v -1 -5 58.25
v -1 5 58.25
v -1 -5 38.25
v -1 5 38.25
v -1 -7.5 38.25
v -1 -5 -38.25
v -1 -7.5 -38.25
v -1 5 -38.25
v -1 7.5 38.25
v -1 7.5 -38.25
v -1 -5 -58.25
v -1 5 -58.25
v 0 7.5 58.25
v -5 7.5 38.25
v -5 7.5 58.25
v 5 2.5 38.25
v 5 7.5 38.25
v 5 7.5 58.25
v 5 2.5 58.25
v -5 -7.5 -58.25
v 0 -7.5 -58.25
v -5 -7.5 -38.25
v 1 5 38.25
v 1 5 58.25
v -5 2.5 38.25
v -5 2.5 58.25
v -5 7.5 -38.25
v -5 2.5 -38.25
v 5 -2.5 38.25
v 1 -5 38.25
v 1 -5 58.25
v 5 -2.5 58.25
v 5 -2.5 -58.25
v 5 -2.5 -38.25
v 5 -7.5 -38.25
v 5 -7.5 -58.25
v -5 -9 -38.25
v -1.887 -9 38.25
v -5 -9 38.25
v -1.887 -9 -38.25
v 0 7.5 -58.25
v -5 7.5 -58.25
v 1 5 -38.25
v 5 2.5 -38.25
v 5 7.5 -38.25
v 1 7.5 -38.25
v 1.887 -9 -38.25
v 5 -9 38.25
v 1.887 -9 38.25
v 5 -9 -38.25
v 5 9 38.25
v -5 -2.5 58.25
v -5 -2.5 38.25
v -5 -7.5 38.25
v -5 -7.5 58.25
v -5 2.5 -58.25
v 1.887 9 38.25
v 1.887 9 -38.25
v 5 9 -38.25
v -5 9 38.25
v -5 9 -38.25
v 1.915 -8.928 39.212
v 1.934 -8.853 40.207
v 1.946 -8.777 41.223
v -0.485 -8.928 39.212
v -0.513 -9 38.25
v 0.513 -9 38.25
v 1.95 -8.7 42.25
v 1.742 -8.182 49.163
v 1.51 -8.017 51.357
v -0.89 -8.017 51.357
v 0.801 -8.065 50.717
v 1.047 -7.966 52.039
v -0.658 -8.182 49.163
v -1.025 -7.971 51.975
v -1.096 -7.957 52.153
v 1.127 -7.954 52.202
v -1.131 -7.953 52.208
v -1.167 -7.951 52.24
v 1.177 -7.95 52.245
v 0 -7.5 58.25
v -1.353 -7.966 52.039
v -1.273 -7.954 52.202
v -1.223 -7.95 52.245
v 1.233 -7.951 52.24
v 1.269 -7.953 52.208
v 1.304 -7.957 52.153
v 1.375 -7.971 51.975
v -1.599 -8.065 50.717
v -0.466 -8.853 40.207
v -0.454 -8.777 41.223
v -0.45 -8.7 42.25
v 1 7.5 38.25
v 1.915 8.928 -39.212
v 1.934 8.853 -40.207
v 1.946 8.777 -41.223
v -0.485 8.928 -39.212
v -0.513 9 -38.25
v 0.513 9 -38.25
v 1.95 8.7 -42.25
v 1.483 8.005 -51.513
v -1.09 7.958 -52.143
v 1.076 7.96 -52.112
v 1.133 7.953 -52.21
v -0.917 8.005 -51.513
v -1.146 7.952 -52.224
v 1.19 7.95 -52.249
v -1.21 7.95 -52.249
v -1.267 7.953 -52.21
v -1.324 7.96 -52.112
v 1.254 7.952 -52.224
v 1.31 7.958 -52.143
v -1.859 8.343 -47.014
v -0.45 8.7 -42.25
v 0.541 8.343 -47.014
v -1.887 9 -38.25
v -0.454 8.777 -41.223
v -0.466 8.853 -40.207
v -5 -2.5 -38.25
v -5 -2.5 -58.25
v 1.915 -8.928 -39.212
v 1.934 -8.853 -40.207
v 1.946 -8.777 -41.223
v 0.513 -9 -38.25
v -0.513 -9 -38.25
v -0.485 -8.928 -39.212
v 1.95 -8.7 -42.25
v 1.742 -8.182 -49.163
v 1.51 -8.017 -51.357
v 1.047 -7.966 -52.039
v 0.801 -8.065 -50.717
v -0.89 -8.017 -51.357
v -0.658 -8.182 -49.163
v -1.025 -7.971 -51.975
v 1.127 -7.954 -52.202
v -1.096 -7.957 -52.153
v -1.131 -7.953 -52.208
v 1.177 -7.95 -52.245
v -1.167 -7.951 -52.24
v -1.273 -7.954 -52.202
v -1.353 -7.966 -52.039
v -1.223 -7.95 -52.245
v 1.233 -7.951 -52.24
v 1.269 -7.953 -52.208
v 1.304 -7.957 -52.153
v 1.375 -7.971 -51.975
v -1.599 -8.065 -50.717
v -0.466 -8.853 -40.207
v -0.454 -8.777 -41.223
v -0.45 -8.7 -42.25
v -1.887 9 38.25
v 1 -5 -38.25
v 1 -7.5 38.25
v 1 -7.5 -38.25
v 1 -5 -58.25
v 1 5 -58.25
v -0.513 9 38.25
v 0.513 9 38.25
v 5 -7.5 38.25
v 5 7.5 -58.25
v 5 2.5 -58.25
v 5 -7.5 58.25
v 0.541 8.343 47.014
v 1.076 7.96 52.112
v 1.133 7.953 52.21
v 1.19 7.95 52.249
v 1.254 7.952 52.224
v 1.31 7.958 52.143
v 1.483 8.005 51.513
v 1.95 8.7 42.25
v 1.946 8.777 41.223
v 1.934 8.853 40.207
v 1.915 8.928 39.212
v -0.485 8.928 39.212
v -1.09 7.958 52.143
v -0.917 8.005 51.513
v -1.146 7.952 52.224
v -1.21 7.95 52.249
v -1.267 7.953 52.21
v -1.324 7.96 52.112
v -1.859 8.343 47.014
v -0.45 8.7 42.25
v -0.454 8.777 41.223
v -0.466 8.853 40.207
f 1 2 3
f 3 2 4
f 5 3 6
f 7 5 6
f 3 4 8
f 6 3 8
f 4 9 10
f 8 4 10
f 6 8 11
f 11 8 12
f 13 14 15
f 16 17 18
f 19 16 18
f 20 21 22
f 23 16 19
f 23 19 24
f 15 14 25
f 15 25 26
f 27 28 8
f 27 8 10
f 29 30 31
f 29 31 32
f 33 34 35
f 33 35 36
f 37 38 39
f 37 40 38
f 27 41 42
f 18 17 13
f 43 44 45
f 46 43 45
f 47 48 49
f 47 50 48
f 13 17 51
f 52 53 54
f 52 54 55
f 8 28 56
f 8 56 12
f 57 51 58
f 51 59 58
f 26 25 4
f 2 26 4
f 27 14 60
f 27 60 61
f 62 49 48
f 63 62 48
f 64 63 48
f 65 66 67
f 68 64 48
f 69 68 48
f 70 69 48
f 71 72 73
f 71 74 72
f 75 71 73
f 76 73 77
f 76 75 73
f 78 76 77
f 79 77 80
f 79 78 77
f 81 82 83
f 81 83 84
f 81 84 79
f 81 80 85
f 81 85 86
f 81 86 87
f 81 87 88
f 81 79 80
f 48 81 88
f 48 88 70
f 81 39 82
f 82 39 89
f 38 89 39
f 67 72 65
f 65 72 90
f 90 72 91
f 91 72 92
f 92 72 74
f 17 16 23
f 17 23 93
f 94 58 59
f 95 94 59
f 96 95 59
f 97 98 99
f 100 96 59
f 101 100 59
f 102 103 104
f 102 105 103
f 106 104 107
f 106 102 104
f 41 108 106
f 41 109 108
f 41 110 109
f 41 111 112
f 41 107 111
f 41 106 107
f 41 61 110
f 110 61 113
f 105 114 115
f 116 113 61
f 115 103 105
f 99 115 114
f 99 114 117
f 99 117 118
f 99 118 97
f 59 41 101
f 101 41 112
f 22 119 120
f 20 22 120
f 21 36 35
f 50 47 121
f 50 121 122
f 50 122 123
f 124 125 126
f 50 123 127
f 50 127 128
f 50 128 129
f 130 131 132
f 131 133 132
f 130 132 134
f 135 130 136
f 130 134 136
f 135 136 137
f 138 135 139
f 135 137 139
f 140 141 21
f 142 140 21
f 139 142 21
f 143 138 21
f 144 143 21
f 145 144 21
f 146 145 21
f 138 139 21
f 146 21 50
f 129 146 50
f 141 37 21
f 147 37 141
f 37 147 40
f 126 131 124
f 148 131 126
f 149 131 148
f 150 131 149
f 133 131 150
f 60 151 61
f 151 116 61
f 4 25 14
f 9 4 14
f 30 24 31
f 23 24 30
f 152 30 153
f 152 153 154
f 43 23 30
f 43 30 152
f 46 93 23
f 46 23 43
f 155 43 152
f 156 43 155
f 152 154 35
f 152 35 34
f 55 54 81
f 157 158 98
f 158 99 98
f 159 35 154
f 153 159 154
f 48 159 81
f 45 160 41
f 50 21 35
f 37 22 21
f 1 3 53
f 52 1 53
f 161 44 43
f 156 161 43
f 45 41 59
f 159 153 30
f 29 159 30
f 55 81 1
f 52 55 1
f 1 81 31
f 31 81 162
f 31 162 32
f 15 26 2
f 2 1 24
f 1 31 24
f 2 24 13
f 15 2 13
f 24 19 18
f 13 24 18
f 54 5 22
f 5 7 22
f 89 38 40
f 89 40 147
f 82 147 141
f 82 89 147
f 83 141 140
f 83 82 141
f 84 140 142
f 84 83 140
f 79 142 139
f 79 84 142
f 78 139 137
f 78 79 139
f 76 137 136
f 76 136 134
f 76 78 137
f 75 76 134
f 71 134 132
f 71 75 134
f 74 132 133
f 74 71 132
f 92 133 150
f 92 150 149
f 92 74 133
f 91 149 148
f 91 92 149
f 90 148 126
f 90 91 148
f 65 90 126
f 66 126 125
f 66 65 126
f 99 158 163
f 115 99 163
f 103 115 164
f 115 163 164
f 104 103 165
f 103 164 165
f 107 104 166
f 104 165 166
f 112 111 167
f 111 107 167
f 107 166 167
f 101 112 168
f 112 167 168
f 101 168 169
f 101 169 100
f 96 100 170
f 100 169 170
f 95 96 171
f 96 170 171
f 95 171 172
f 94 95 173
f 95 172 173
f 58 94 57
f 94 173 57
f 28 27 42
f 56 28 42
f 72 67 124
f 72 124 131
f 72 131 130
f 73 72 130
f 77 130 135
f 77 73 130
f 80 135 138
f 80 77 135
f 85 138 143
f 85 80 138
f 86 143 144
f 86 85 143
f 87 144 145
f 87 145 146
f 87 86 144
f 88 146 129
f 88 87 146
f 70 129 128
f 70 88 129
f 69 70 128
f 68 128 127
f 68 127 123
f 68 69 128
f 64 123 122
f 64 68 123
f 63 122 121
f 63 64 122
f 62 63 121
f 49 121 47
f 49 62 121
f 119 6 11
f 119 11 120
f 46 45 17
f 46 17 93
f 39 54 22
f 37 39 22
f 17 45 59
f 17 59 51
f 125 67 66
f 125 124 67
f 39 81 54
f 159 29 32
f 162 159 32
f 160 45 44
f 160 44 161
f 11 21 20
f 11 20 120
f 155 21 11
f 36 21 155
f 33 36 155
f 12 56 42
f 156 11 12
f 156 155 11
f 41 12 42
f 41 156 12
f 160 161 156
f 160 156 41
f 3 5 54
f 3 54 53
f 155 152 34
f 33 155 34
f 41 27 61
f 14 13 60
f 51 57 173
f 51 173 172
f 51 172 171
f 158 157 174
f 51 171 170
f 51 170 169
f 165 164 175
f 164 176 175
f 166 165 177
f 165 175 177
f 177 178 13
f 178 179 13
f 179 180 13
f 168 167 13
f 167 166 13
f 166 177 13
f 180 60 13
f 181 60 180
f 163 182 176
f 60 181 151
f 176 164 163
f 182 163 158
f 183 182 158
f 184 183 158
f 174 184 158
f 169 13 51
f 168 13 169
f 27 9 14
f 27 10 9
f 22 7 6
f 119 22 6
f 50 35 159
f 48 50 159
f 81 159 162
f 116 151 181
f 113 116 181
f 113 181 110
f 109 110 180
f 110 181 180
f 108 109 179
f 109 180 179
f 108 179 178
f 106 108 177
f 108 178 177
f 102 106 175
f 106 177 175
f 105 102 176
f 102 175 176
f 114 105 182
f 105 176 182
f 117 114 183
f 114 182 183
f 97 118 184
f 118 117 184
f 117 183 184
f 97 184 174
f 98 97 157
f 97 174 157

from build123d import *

# Parameters (mm, degrees)
SKETCH1_W               = 116.5
SKETCH1_H               = 15
BOSS_EXTRUDE1_DEPTH     = 1
SKETCH2_W               = 20
SKETCH2_H               = 15
BOSS_EXTRUDE2_DEPTH     = 4
CUT_EXTRUDE1_DEPTH      = 97.920070161
MIRROR2_COPY_1_SKETCH_W = 20
MIRROR2_COPY_1_SKETCH_H = 15
MIRROR2_COPY_1_DEPTH    = 4
MIRROR2_COPY_2_DEPTH    = 97.920070161
BOSS_EXTRUDE5_DEPTH     = 1.5
CUT_EXTRUDE2_DEPTH      = 60.783463433
SKETCH9_R               = 0.75
CUT_EXTRUDE3_DEPTH      = 117.954050806


with BuildPart() as part:
    # Sketch1 → Boss-Extrude1 (new, symmetric)
    with BuildSketch(Plane(origin=(0, 0, 0), x_dir=(0, 0, -1), z_dir=(1, 0, 0))):
        Rectangle(SKETCH1_W, SKETCH1_H)
    extrude(amount=BOSS_EXTRUDE1_DEPTH, both=True)

    # Sketch2 → Boss-Extrude2 (add)
    with BuildSketch(Plane(origin=(1, 0, 0), x_dir=(0, 0, -1), z_dir=(1, 0, 0))):
        with Locations((48.25, 0)):
            Rectangle(SKETCH2_W, SKETCH2_H)
    boss_extrude2 = extrude(amount=BOSS_EXTRUDE2_DEPTH)

    # Sketch3 → Cut-Extrude1 (cut, through all)
    with BuildSketch(Plane.XY.offset(-38.25)):
        Polygon((5, 2.5), (1, 5), (1, -5), (5, -2.5), align=None)
    cut_extrude1 = extrude(amount=-CUT_EXTRUDE1_DEPTH, mode=Mode.SUBTRACT)

    # Mirror1: Boss-Extrude2, Cut-Extrude1 across plane
    add(boss_extrude2.mirror(Plane(origin=(0, 0, 0), x_dir=(0, 0, 1), z_dir=(1, 0, 0))))
    add(cut_extrude1.mirror(Plane(origin=(0, 0, 0), x_dir=(0, 0, 1), z_dir=(1, 0, 0))), mode=Mode.SUBTRACT)

    # Mirror2: Boss-Extrude2, Cut-Extrude1 across plane
    add(boss_extrude2.mirror(Plane.XY))
    add(cut_extrude1.mirror(Plane.XY), mode=Mode.SUBTRACT)

    # Mirror2 copy 1 sketch → Mirror2 copy 1 (add)
    with BuildSketch(Plane.ZY.offset(1)):
        with Locations((48.25, 0)):
            Rectangle(MIRROR2_COPY_1_SKETCH_W, MIRROR2_COPY_1_SKETCH_H)
    extrude(amount=MIRROR2_COPY_1_DEPTH)

    # Mirror2 copy 2 sketch → Mirror2 copy 2 (cut, through all)
    with BuildSketch(Plane(origin=(0, 0, 38.25), x_dir=(-1, 0, 0), z_dir=(0, 0, -1))):
        Polygon((5, 2.5), (1, 5), (1, -5), (5, -2.5), align=None)
    extrude(amount=-MIRROR2_COPY_2_DEPTH, mode=Mode.SUBTRACT)

    # Sketch7 → Boss-Extrude5 (add)
    with BuildSketch(Plane(origin=(0, 7.5, 0), x_dir=(1, 0, 0), z_dir=(0, 1, 0))):
        Polygon((0, -58.25), (-5, -38.25), (-5, 38.25), (0, 58.25), (5, 38.25), (5, -38.25), align=None)
    boss_extrude5 = extrude(amount=BOSS_EXTRUDE5_DEPTH)

    # Sketch8 → Cut-Extrude2 (cut, through all)
    with BuildSketch(Plane.ZY.offset(5)):
        Polygon((-38.25, 9), (-58.25, 7.5), (-58.25, 9), align=None)
        Polygon((58.25, 9), (38.25, 9), (58.25, 7.5), align=None)
    cut_extrude2 = extrude(amount=-CUT_EXTRUDE2_DEPTH, mode=Mode.SUBTRACT)

    # Sketch9 → Cut-Extrude3 (cut, through all)
    with BuildSketch(Plane.XY.offset(58.25)):
        with Locations((1.2, 8.7)):
            Circle(SKETCH9_R)
        with Locations((-1.2, 8.7)):
            Circle(SKETCH9_R)
    cut_extrude3 = extrude(amount=-CUT_EXTRUDE3_DEPTH, mode=Mode.SUBTRACT)

    # Mirror4: Boss-Extrude5, Cut-Extrude2, Cut-Extrude3 across plane
    add(boss_extrude5.mirror(Plane.ZX))
    add(cut_extrude2.mirror(Plane.ZX), mode=Mode.SUBTRACT)
    add(cut_extrude3.mirror(Plane.ZX), mode=Mode.SUBTRACT)


solid = part.part
